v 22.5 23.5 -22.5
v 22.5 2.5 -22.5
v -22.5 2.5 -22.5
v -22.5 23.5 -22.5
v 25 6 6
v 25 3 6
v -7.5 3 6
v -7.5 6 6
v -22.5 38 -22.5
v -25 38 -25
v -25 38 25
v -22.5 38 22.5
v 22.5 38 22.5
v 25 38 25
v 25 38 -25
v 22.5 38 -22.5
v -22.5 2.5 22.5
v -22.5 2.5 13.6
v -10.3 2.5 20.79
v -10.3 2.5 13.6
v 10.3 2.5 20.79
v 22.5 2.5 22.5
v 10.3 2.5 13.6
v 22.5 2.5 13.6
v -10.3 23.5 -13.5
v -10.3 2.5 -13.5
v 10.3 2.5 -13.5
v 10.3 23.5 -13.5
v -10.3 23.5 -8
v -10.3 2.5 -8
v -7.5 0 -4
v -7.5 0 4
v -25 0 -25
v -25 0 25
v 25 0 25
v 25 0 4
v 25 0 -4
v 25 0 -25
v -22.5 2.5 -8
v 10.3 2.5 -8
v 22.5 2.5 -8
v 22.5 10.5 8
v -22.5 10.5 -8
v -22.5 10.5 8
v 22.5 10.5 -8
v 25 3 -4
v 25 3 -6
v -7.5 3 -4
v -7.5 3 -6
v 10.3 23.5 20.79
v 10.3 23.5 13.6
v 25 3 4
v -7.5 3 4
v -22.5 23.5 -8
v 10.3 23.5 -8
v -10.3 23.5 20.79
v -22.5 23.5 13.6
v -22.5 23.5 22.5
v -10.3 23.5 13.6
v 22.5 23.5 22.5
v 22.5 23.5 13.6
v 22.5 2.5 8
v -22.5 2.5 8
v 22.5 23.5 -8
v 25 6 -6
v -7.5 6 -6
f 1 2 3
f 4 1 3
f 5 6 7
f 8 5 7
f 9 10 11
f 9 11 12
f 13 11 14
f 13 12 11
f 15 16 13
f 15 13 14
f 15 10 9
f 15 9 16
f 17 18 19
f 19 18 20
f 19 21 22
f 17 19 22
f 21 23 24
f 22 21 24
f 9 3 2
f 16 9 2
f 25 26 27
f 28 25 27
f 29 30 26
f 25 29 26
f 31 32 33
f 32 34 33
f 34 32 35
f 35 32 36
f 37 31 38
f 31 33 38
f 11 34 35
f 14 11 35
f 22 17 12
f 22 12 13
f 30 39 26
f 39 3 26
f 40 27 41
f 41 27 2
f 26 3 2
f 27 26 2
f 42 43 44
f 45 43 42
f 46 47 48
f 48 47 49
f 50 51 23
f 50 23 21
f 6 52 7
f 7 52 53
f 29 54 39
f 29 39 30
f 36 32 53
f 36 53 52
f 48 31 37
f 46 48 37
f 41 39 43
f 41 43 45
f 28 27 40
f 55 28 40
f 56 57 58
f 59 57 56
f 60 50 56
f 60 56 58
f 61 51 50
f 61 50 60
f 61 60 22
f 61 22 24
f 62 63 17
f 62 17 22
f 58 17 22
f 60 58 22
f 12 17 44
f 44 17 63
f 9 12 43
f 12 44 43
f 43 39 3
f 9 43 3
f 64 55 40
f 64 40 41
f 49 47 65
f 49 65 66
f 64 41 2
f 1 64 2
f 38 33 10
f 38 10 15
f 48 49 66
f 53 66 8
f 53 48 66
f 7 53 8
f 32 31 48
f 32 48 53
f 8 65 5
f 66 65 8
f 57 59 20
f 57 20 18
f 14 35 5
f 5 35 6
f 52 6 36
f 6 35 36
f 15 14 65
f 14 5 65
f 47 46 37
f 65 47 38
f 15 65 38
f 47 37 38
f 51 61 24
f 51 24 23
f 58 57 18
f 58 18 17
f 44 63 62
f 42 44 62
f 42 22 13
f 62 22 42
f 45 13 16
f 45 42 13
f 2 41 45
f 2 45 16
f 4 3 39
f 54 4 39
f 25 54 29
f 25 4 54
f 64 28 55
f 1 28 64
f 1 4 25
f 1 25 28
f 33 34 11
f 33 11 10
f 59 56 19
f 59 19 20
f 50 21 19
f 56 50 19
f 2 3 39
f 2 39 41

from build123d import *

# Parameters (mm, degrees)
SKETCH1_W             = 50
SKETCH1_H             = 50
BOSS_EXTRUDE1_DEPTH   = 38
SHELL1_T              = -2.5
BOSS_EXTRUDE2_DEPTH   = 21
BOSS_EXTRUDE2_2_DEPTH = 21
SKETCH3_W             = 45
SKETCH3_H             = 16
BOSS_EXTRUDE3_DEPTH   = 8
SKETCH4_W             = 32.5
SKETCH4_H             = 8
CUT_EXTRUDE1_DEPTH    = 3
SKETCH7_W             = 32.5
SKETCH7_H             = 12
CUT_EXTRUDE2_DEPTH    = 3


with BuildPart() as part:
    # Sketch1 → Boss-Extrude1 (new body)
    with BuildSketch(Plane(origin=(0, 0, 0), x_dir=(1, 0, 0), z_dir=(0, 1, 0))):
        Rectangle(SKETCH1_W, SKETCH1_H)
    extrude(amount=BOSS_EXTRUDE1_DEPTH)

    # Shell1
    shell1_openings = [part.faces().sort_by_distance(p)[0] for p in [
        (0, 38, 0),
    ]]
    offset(amount=SHELL1_T, openings=shell1_openings, kind=Kind.INTERSECTION)

    # Sketch3 → Boss-Extrude3 (add)
    with BuildSketch(Plane(origin=(0, 2.5, 0), x_dir=(1, 0, 0), z_dir=(0, 1, 0))):
        Rectangle(SKETCH3_W, SKETCH3_H)
    extrude(amount=BOSS_EXTRUDE3_DEPTH)

    # Sketch4 → Cut-Extrude1 (cut)
    with BuildSketch(Plane.XZ):
        with Locations((8.75, 0)):
            Rectangle(SKETCH4_W, SKETCH4_H)
    extrude(amount=-CUT_EXTRUDE1_DEPTH, mode=Mode.SUBTRACT)

    # Sketch7 → Cut-Extrude2 (cut)
    with BuildSketch(Plane(origin=(0, 3, 0), x_dir=(-1, 0, 0), z_dir=(0, -1, 0))):
        with Locations((-8.75, 0)):
            Rectangle(SKETCH7_W, SKETCH7_H)
    extrude(amount=-CUT_EXTRUDE2_DEPTH, mode=Mode.SUBTRACT)


with BuildPart() as body_2:
    # Sketch2 → Boss-Extrude2 (new body)
    with BuildSketch(Plane(origin=(0, 2.5, 0), x_dir=(1, 0, 0), z_dir=(0, 1, 0))):
        Polygon((-10.3, -13.6), (-22.5, -13.6), (-22.5, -22.5), (0.190053949, -22.5), (22.5, -22.5), (22.5, -13.6), (10.3, -13.6), (10.3, -20.79), (0.190053949, -20.79), (-10.3, -20.79), align=None)
    extrude(amount=BOSS_EXTRUDE2_DEPTH)


with BuildPart() as body_3:
    # Sketch2 → Boss-Extrude2 2 (new body)
    with BuildSketch(Plane(origin=(0, 2.5, 0), x_dir=(1, 0, 0), z_dir=(0, 1, 0))):
        Polygon((-22.5, 8), (-10.3, 8), (-10.3, 13.5), (0, 13.5), (10.3, 13.5), (10.3, 8), (22.5, 8), (22.5, 22.5), (0, 22.5), (-22.5, 22.5), align=None)
    extrude(amount=BOSS_EXTRUDE2_2_DEPTH)


solid = Compound([part.part, body_2.part, body_3.part])
